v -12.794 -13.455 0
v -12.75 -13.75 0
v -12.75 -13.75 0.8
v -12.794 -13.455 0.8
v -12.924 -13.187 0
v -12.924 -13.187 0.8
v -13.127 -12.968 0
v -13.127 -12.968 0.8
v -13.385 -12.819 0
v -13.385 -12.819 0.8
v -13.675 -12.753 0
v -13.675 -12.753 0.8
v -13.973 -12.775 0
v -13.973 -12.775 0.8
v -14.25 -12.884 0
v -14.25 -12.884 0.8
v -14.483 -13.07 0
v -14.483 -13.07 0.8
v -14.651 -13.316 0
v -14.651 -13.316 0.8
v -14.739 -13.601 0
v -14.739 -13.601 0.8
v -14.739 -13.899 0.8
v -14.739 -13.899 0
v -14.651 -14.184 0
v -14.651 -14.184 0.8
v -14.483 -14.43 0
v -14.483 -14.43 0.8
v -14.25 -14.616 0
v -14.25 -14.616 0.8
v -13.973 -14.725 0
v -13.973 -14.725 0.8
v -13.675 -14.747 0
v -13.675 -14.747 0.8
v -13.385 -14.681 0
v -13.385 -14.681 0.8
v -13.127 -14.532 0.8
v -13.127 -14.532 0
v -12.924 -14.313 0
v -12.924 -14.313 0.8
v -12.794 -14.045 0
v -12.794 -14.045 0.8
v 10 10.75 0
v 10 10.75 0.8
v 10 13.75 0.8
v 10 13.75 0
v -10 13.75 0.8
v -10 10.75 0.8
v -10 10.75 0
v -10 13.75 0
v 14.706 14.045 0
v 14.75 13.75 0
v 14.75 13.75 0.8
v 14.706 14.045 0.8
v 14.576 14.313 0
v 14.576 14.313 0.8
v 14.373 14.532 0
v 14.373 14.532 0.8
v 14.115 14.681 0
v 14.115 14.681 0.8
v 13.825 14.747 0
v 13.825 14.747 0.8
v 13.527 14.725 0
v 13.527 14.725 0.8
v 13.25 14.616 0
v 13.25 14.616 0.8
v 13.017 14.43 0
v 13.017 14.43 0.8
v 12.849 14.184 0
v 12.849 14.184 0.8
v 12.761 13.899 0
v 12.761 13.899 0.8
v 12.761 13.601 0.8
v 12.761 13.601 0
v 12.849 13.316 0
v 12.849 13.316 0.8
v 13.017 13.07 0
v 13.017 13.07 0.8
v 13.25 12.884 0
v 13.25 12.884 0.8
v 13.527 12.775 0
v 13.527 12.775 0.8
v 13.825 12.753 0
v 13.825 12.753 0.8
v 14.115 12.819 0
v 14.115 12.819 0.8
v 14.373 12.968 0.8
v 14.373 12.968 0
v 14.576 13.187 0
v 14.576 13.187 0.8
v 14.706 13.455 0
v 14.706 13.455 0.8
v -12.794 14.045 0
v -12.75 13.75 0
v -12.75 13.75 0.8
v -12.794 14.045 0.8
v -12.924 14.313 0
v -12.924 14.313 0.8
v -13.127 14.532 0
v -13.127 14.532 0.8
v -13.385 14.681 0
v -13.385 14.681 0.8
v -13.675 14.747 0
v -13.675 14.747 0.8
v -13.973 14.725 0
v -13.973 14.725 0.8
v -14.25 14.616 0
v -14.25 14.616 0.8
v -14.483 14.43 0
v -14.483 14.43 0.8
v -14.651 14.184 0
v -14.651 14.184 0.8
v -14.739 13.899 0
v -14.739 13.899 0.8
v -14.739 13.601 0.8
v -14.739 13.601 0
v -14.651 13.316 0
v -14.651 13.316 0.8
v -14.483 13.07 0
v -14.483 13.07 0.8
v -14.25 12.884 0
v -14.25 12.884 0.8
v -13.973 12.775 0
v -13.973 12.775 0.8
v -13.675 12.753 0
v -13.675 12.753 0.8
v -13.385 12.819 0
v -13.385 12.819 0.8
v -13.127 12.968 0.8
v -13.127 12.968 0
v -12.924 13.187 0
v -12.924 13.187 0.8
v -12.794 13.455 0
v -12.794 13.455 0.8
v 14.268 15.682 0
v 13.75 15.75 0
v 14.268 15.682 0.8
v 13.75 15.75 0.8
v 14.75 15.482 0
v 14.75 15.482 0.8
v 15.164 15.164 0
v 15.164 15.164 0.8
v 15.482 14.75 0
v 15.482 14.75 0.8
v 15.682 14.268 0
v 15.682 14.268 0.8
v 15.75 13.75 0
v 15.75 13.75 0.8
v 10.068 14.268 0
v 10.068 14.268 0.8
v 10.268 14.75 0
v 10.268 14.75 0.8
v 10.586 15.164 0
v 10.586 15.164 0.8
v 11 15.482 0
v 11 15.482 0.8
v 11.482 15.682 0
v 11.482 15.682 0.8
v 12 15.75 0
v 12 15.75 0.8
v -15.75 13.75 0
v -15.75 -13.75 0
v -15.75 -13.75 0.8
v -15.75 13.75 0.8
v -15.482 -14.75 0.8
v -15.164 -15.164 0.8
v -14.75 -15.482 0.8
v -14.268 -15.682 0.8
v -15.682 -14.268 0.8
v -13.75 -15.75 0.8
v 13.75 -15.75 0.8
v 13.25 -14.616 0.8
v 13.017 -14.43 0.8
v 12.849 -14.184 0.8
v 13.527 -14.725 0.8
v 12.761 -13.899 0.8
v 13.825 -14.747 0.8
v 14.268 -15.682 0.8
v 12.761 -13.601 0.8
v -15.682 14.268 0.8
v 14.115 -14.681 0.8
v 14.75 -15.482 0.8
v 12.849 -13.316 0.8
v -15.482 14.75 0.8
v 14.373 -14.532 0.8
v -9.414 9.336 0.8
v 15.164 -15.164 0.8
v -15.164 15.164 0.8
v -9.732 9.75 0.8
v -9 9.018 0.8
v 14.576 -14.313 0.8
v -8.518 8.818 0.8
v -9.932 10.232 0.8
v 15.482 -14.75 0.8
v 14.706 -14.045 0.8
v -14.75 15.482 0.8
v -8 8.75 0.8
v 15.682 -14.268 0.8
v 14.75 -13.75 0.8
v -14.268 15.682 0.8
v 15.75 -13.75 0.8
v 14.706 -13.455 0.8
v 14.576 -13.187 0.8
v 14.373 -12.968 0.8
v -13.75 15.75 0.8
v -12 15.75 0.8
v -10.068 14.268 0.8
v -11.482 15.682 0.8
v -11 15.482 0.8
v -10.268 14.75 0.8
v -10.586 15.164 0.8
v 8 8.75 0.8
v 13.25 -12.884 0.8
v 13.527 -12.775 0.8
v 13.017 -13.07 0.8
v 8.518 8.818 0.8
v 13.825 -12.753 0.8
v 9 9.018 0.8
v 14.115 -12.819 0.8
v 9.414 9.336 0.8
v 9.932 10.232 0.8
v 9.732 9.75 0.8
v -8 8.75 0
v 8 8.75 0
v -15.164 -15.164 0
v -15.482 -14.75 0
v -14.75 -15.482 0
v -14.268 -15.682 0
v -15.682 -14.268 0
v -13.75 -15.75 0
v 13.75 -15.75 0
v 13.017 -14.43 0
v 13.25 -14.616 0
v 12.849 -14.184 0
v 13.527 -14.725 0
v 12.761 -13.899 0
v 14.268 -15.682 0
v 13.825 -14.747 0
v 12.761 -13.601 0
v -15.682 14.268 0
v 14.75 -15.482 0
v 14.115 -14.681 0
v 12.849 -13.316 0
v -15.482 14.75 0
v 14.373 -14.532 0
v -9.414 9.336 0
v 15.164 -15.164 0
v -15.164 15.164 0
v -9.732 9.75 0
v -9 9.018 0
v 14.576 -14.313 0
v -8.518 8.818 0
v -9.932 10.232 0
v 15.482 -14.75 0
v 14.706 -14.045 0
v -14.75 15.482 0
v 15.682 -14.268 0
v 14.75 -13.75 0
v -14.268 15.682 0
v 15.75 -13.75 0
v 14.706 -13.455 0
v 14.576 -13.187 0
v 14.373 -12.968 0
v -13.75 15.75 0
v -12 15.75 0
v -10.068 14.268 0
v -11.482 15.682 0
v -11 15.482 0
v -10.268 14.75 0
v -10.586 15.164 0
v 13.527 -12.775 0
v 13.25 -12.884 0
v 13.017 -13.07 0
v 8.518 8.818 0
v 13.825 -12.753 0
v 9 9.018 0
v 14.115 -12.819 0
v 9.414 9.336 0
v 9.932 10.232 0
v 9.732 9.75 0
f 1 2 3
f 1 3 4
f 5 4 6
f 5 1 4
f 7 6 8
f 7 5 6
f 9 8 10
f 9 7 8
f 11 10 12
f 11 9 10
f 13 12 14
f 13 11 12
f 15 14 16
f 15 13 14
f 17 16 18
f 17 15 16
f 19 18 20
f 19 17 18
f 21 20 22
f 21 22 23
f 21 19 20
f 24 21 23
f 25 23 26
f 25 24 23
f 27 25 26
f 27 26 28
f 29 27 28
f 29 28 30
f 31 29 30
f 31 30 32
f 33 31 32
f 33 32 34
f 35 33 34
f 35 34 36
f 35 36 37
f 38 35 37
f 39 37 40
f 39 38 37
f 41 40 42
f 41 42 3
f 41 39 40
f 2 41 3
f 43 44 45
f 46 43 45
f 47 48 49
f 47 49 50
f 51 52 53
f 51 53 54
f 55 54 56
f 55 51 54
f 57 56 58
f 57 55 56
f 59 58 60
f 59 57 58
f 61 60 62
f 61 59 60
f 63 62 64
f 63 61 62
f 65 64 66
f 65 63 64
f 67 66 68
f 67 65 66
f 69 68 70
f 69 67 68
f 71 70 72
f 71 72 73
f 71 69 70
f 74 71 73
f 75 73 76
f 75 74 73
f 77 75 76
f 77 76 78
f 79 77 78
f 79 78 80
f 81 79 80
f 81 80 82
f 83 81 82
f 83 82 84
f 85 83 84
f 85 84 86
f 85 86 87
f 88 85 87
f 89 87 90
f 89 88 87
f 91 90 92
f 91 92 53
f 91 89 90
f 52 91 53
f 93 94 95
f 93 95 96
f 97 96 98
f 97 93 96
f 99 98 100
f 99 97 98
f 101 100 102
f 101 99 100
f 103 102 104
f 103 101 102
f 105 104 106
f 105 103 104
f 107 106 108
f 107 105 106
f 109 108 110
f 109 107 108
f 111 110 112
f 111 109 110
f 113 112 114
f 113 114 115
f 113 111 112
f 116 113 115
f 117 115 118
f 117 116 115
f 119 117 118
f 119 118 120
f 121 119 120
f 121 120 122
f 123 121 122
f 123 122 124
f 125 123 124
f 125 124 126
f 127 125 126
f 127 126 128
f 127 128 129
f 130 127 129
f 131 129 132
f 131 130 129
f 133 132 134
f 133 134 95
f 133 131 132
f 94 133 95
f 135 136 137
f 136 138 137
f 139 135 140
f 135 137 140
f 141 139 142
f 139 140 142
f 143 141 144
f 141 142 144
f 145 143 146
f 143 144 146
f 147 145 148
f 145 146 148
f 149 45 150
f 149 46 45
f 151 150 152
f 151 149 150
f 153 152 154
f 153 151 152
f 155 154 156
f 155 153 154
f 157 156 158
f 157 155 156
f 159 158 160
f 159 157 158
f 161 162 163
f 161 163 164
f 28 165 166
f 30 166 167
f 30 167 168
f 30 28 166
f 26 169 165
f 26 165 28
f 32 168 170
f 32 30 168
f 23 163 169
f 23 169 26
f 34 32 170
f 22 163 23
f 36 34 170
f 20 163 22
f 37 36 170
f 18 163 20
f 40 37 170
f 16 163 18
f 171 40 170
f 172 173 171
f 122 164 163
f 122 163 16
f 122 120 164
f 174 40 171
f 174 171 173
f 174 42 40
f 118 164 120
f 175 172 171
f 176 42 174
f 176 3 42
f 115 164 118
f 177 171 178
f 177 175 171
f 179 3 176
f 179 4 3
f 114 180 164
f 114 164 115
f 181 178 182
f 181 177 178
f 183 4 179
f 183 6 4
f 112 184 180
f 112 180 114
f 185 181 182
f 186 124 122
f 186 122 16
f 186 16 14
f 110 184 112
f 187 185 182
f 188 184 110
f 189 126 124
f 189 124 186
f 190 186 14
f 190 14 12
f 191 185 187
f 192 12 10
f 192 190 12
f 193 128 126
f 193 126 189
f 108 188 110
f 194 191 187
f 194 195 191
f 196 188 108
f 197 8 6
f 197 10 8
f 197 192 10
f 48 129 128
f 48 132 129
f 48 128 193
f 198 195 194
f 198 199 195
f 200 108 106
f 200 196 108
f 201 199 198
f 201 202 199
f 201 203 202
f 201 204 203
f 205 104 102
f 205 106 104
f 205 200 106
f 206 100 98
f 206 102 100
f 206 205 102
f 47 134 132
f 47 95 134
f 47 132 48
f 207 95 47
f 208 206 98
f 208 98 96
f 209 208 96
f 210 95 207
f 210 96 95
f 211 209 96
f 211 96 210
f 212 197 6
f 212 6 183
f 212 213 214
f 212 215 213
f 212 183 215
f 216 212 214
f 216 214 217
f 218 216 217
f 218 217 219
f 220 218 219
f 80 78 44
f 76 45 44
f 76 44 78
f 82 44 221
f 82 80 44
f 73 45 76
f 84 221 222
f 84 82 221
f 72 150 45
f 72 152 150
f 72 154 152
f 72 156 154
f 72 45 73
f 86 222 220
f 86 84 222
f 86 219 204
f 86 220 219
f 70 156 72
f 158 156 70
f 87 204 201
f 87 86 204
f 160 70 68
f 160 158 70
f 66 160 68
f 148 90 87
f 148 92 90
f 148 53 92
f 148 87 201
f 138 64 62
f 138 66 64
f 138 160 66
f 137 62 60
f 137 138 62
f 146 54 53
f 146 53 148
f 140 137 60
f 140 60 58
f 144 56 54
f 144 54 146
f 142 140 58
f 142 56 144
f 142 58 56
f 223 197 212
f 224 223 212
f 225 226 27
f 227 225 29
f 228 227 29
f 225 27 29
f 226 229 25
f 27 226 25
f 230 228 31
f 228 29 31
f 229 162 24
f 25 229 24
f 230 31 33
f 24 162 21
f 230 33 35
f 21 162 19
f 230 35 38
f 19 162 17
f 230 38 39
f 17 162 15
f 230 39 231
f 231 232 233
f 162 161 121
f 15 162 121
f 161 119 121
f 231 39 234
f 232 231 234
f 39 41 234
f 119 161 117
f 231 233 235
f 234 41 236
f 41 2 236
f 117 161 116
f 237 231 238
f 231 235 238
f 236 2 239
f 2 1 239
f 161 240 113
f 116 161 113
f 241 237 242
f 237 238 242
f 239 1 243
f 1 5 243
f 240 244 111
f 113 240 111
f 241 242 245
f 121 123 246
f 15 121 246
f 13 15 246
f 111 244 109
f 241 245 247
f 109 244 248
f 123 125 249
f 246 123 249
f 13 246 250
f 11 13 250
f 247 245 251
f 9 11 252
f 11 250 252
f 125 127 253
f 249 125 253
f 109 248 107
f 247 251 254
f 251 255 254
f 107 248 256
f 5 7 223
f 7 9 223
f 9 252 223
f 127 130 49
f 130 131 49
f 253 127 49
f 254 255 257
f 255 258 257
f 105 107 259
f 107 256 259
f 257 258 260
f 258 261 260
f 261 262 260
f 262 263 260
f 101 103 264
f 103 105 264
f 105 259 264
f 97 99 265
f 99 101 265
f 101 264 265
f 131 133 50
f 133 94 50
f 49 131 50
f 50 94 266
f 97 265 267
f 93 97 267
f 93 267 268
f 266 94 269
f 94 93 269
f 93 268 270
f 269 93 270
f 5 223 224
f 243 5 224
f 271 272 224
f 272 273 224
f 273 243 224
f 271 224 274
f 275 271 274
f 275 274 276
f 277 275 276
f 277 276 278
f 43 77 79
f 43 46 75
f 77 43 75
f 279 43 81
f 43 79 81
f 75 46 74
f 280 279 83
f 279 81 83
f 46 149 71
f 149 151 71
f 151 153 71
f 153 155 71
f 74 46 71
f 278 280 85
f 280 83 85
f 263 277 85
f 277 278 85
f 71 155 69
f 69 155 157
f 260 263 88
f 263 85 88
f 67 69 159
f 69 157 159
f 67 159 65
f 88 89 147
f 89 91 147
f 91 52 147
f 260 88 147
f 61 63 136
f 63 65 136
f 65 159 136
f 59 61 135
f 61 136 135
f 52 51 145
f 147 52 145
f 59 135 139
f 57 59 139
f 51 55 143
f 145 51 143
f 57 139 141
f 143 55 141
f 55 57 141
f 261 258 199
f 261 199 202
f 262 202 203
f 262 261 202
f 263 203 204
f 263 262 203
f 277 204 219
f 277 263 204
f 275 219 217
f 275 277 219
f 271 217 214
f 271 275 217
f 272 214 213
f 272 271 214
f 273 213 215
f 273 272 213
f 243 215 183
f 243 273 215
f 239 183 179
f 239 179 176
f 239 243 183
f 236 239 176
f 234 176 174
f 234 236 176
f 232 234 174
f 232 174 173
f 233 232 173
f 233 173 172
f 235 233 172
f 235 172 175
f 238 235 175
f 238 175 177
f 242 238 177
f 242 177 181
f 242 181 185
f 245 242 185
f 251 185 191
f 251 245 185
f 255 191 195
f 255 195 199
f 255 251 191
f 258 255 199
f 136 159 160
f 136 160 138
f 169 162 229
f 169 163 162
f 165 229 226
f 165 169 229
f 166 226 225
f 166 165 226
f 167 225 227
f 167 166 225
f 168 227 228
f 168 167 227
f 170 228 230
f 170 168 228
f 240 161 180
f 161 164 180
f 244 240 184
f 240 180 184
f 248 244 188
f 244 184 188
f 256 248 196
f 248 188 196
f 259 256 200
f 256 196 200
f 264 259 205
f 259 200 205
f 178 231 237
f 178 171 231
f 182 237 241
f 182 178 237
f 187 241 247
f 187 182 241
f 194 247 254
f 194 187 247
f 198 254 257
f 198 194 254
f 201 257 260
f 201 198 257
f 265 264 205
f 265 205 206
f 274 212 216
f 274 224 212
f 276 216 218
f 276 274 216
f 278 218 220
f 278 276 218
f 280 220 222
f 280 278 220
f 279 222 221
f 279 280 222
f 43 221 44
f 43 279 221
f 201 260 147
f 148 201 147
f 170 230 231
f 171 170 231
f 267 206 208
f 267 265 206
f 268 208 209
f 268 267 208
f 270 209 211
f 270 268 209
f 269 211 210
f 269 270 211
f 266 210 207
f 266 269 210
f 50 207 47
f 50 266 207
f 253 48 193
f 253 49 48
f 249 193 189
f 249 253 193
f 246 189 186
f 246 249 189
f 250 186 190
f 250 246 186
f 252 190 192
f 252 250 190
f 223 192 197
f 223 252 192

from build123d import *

# Parameters (mm, degrees)
SKETCH_W     = 31.5
SKETCH_H     = 31.5
SKETCH_R     = 1
PAD_DEPTH    = 0.8
FILLET_R     = 2
SKETCH001_W  = 20
SKETCH001_H  = 7
POCKET_DEPTH = 0.801
FILLET001_R  = 2


with BuildPart() as part:
    # Sketch → Pad (new body)
    with BuildSketch(Plane.XY):
        Rectangle(SKETCH_W, SKETCH_H)
        with Locations((-13.75, 13.75)):
            Circle(SKETCH_R, mode=Mode.SUBTRACT)
        with Locations((13.75, 13.75)):
            Circle(SKETCH_R, mode=Mode.SUBTRACT)
        with Locations((-13.75, -13.75)):
            Circle(SKETCH_R, mode=Mode.SUBTRACT)
        with Locations((13.75, -13.75)):
            Circle(SKETCH_R, mode=Mode.SUBTRACT)
    extrude(amount=PAD_DEPTH)

    # Fillet
    fillet_edges = [part.edges().sort_by_distance(p)[0] for p in [
        (-15.75, 15.75, 0.4),
        (-15.75, -15.75, 0.4),
        (15.75, -15.75, 0.4),
        (15.75, 15.75, 0.4),
    ]]
    fillet(fillet_edges, radius=FILLET_R)

    # Sketch001 (on Face5 of Fillet) → Pocket (cut, through all)
    with BuildSketch(Plane.XY.offset(0.8)):
        with Locations((0, 12.25)):
            Rectangle(SKETCH001_W, SKETCH001_H)
    extrude(amount=-POCKET_DEPTH, mode=Mode.SUBTRACT)

    # Fillet001
    fillet001_edges = [part.edges().sort_by_distance(p)[0] for p in [
        (-10, 15.75, 0.4),
        (-10, 8.75, 0.4),
        (10, 8.75, 0.4),
        (10, 15.75, 0.4),
    ]]
    fillet(fillet001_edges, radius=FILLET001_R)


solid = part.part
